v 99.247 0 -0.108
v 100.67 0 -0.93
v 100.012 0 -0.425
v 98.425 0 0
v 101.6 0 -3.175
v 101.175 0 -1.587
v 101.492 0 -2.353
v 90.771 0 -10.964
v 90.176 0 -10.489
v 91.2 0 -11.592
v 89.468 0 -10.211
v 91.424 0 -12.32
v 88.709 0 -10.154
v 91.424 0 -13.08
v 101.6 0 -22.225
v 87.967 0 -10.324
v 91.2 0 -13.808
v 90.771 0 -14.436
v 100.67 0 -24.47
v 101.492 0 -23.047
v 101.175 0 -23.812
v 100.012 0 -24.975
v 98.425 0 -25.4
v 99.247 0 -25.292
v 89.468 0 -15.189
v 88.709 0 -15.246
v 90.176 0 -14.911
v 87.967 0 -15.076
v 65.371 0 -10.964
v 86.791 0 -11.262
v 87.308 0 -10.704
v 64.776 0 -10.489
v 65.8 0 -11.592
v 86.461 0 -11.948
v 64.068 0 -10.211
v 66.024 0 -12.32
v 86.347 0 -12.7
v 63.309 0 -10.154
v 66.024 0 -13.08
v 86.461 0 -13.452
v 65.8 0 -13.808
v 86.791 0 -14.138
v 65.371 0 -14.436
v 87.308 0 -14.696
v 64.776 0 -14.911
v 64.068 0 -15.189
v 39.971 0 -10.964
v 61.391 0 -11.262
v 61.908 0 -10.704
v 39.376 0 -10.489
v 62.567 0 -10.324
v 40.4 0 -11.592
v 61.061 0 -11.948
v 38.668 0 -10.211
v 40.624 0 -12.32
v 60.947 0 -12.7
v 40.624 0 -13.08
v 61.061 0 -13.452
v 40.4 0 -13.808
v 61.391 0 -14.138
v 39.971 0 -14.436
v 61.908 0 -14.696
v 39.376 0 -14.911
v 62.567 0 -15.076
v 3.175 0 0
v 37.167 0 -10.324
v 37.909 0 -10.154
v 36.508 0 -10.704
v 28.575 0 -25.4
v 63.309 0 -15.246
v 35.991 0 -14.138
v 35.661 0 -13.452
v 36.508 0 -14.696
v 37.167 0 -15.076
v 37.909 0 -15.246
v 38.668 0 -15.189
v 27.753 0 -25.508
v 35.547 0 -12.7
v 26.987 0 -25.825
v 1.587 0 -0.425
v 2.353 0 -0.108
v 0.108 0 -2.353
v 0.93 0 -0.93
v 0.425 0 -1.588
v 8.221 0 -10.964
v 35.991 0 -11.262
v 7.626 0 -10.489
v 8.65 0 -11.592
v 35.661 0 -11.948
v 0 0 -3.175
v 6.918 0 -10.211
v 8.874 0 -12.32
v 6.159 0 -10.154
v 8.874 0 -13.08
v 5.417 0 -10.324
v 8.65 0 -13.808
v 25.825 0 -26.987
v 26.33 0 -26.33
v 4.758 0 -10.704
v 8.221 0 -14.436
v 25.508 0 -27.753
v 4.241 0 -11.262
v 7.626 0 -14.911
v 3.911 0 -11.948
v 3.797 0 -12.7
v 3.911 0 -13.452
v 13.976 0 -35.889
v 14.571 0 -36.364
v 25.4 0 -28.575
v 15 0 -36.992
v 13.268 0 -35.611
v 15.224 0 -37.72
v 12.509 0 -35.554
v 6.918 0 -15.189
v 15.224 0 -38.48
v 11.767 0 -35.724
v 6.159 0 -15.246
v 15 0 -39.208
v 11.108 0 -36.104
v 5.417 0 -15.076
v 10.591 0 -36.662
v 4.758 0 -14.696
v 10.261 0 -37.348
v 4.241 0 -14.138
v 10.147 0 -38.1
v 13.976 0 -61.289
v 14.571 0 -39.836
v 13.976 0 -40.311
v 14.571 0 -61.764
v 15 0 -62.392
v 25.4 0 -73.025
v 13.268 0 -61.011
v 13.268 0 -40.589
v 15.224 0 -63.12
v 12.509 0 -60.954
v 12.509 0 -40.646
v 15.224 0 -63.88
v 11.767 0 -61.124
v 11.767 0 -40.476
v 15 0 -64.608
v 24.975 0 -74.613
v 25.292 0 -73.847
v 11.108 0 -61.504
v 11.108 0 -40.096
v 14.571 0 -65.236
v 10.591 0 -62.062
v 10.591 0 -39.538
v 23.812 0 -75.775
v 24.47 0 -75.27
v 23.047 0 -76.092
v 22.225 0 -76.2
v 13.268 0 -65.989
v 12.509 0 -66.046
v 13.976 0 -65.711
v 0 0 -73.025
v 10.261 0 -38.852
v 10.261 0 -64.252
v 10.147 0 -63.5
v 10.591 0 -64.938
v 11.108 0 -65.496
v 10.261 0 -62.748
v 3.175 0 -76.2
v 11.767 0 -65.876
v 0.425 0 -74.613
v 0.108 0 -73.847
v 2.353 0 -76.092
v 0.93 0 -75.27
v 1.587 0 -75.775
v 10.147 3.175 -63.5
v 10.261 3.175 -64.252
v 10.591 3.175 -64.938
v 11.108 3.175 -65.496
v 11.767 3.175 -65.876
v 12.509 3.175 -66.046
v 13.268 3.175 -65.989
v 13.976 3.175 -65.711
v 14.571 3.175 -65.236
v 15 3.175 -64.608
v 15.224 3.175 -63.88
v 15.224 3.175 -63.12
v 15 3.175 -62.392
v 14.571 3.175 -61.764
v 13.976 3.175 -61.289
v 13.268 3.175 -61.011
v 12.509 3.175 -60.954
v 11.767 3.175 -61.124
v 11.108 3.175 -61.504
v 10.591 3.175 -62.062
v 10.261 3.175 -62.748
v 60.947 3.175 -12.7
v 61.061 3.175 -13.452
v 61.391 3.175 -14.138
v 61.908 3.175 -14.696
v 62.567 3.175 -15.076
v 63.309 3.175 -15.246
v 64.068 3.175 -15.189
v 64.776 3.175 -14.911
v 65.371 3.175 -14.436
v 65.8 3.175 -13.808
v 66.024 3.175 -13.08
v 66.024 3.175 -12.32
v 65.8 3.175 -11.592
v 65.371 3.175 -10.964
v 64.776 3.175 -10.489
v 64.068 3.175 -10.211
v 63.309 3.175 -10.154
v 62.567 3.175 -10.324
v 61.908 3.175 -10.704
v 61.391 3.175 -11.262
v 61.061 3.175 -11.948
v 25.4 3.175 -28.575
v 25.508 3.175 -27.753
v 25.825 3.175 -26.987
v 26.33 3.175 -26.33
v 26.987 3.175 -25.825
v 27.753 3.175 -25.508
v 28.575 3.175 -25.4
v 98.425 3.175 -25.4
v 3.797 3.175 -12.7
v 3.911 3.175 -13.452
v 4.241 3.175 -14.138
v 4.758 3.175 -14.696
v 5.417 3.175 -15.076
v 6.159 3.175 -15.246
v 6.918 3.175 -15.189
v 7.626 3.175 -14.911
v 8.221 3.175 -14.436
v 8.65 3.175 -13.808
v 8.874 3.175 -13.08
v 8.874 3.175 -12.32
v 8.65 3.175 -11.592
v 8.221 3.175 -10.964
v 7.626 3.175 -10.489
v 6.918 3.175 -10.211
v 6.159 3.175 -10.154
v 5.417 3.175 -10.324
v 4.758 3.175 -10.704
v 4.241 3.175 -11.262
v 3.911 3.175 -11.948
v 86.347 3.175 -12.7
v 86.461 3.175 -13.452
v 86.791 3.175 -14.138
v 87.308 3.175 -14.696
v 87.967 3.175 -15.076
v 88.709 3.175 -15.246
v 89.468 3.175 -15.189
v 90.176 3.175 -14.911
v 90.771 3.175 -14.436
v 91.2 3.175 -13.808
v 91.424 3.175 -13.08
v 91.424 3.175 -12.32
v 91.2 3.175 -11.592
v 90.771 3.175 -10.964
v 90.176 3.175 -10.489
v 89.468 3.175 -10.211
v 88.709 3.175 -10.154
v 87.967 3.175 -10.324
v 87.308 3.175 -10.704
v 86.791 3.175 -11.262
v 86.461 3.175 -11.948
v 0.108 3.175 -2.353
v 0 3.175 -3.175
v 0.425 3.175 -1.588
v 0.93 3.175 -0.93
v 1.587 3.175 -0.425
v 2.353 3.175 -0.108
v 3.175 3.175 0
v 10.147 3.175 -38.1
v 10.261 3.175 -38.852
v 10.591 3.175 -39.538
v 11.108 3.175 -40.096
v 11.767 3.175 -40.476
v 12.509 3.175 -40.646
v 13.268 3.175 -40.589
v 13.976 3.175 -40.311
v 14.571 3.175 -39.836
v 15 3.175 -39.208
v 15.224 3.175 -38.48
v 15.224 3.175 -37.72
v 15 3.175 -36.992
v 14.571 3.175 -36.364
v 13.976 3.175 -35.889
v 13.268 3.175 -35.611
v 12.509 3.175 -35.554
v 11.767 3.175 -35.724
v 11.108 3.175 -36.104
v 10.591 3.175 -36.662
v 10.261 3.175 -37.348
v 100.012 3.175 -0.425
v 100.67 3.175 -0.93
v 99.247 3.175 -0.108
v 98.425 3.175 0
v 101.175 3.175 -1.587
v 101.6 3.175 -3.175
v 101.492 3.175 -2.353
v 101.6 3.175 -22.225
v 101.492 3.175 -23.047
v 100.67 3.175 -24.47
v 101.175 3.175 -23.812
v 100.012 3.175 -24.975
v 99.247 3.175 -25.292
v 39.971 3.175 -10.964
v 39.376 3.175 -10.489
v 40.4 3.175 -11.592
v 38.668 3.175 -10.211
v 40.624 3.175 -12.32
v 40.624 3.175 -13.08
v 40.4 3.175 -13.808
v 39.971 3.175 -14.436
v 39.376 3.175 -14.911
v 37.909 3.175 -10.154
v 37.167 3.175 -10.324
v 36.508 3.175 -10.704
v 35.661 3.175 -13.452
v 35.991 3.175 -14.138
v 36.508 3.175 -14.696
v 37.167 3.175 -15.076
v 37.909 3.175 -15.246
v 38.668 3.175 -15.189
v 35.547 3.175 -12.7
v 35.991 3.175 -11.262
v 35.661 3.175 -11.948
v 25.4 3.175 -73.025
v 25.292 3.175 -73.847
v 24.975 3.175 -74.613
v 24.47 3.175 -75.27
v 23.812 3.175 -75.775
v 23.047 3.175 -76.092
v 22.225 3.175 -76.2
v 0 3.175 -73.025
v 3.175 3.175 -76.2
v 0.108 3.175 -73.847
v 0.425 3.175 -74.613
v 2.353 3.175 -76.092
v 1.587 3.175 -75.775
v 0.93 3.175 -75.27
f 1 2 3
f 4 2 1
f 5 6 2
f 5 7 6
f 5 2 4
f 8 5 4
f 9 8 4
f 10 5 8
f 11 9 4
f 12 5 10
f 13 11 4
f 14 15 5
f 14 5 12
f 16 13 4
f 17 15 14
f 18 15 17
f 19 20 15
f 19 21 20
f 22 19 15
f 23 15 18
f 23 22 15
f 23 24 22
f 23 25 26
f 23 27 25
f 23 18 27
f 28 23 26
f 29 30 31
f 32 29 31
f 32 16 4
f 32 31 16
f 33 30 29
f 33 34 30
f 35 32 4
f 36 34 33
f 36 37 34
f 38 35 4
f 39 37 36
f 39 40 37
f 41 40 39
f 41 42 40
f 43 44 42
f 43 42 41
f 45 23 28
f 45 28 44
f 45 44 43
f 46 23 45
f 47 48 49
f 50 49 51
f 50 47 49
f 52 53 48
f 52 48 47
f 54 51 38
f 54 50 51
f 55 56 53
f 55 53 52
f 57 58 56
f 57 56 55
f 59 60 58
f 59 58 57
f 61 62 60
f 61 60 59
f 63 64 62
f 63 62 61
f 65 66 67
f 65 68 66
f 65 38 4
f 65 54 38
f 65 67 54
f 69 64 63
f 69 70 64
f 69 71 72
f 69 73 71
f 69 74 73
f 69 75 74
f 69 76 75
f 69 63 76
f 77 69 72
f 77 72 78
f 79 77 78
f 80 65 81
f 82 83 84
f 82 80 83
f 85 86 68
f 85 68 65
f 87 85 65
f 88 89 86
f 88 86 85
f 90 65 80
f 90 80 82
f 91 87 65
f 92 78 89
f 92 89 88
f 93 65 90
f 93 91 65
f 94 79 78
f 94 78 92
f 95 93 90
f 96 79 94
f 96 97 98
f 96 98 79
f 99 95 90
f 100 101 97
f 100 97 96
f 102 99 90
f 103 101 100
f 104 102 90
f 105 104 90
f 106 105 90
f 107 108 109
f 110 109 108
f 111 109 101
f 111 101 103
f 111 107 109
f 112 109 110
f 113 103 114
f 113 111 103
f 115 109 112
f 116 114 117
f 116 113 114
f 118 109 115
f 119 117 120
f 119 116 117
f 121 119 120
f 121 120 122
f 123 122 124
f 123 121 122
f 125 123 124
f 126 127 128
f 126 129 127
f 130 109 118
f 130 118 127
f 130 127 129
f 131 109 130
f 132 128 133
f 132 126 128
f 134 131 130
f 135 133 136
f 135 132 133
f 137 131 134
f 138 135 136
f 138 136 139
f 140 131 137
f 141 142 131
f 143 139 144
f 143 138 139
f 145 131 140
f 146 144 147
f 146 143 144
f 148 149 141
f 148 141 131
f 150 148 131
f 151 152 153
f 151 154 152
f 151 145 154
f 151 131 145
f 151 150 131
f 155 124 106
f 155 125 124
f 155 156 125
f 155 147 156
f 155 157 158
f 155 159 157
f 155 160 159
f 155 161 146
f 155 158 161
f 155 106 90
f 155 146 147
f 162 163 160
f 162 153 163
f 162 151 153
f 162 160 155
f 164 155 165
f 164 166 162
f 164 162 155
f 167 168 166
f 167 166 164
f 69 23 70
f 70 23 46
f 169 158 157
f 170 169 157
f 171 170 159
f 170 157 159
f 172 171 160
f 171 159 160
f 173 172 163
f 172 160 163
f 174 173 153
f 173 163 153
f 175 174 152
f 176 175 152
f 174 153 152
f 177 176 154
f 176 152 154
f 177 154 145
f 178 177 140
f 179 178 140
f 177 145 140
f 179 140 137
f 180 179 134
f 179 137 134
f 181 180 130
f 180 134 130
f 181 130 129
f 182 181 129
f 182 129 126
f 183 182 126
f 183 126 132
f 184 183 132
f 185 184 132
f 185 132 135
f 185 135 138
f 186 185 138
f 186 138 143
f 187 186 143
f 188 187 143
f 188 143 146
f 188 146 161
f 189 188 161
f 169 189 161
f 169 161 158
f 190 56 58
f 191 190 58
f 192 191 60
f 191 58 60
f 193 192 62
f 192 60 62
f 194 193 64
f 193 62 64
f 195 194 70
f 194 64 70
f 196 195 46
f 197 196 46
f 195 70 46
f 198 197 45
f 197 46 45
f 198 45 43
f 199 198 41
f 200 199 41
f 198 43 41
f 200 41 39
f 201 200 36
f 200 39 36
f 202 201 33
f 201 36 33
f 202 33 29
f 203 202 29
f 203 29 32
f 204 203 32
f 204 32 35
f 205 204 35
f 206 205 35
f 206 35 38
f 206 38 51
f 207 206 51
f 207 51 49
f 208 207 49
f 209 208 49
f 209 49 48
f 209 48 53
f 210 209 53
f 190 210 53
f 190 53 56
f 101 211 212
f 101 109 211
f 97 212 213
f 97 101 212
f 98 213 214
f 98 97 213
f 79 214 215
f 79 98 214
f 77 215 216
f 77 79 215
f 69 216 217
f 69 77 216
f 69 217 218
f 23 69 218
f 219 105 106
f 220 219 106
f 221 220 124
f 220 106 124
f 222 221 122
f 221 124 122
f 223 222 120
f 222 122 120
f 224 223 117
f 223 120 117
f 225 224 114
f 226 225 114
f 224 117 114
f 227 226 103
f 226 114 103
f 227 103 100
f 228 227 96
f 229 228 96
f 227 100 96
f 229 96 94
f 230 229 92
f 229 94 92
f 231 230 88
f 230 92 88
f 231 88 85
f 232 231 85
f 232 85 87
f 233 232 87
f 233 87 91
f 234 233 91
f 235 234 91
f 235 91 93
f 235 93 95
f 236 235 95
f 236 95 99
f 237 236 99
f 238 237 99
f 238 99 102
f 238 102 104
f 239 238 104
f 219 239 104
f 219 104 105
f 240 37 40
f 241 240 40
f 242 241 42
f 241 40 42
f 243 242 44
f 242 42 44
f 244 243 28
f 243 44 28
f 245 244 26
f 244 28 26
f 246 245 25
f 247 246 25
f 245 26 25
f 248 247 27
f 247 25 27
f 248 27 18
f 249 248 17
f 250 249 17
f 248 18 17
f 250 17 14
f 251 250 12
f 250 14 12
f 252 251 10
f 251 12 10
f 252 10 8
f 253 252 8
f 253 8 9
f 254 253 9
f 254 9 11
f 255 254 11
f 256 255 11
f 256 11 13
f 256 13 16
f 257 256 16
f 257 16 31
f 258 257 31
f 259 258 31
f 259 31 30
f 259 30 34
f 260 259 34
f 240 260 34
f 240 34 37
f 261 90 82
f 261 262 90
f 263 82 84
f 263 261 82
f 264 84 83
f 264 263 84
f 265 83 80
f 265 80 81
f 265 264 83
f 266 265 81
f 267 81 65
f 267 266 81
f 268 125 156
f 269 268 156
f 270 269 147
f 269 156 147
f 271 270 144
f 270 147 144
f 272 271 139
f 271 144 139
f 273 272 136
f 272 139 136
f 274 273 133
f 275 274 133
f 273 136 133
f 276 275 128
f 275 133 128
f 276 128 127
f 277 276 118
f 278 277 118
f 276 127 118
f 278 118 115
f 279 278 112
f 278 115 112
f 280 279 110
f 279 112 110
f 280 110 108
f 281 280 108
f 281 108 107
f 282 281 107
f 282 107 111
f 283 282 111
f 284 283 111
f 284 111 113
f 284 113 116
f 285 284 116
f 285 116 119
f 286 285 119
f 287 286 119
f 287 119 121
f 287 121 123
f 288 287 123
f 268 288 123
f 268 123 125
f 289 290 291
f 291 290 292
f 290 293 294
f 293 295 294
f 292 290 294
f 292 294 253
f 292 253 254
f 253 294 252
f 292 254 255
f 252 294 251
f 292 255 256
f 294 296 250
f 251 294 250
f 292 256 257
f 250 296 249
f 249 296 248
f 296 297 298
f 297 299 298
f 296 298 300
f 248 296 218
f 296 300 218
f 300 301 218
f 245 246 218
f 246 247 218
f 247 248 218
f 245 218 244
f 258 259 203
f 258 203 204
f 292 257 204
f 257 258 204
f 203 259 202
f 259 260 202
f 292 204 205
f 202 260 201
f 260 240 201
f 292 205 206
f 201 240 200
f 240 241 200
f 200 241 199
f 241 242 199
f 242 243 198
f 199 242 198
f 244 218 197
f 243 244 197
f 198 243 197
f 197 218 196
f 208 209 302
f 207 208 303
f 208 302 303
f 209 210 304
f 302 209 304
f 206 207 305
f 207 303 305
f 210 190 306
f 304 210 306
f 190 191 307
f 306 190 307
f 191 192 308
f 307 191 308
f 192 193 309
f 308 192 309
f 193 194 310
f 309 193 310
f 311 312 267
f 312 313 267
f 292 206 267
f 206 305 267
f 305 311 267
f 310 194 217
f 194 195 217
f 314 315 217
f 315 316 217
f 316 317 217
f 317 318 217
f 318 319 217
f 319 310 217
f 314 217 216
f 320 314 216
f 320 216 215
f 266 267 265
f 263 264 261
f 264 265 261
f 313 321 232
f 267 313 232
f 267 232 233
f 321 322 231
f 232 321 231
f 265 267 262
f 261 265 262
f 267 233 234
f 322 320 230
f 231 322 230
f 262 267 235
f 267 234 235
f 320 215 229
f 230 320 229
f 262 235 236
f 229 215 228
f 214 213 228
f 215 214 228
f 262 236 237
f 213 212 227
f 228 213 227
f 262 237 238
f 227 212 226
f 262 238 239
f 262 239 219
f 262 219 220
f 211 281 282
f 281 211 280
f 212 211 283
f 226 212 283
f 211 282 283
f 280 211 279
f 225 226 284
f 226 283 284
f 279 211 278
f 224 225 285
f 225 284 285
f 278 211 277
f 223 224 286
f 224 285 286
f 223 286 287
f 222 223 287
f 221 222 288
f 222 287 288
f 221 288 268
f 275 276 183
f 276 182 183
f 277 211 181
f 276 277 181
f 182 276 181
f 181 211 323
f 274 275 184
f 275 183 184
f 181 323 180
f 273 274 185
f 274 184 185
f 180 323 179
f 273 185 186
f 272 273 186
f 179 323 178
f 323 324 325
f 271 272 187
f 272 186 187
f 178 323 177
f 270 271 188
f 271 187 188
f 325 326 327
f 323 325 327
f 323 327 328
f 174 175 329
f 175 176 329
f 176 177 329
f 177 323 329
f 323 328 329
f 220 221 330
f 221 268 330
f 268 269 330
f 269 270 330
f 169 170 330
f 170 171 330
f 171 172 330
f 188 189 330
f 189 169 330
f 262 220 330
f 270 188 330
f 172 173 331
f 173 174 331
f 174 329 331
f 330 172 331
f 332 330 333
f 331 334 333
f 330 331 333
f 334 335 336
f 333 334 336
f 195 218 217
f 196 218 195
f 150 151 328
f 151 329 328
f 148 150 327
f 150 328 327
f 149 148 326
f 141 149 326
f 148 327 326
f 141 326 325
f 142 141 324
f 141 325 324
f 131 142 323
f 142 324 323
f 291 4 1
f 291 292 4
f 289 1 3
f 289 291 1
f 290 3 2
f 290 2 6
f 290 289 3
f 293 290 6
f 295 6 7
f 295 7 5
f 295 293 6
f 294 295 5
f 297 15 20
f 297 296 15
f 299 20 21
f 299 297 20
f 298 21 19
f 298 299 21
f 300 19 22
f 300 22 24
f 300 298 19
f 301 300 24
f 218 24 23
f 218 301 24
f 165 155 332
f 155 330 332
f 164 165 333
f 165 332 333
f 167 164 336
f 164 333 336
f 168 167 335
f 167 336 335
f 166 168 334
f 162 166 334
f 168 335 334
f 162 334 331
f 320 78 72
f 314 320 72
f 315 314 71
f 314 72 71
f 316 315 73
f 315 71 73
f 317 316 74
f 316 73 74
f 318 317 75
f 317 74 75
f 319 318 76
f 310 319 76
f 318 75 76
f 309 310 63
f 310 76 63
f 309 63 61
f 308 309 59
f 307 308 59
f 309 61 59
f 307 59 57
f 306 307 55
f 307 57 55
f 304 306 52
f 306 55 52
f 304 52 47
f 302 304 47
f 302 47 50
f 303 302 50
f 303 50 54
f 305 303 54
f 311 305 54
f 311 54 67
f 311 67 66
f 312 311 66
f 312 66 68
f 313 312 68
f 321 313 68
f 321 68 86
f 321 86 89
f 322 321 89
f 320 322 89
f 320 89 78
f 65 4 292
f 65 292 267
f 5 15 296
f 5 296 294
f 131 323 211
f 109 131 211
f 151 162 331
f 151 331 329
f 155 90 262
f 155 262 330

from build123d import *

# Parameters (mm, degrees)
BOSS_EXTRUDE1_DEPTH    = 3.175
F_10_CLEARANCE_HOLE1_D = 5.1054
F_10_CLEARANCE_HOLE4_D = 5.1054
CUT_EXTRUDE1_DEPTH     = 128.039681301
FILLET1_R              = 3.175


with BuildPart() as part:
    # Sketch1 → Boss-Extrude1 (new body)
    with BuildSketch(Plane(origin=(0, 0, 0), x_dir=(1, 0, 0), z_dir=(0, 1, 0))):
        Polygon((0, 0), (0, 76.2), (25.4, 76.2), (101.6, 25.4), (101.6, 0), align=None)
    extrude(amount=BOSS_EXTRUDE1_DEPTH)

    # #10 Clearance Hole1 (through all)
    with Locations(Plane(origin=(0, 3.175, 0), x_dir=(1, 0, 0), z_dir=(0, 1, 0))):
        with Locations((88.9, 12.7), (12.7, 63.5), (12.7, 38.1), (38.1, 12.7), (63.5, 12.7)):
            Hole(F_10_CLEARANCE_HOLE1_D / 2)

    # #10 Clearance Hole4 (through all)
    with Locations(Plane(origin=(0, 3.175, 0), x_dir=(1, 0, 0), z_dir=(0, 1, 0))):
        with Locations((6.35, 12.7)):
            Hole(F_10_CLEARANCE_HOLE4_D / 2)

    # Sketch6 → Cut-Extrude1 (cut, through all)
    with BuildSketch(Plane(origin=(0, 3.175, 0), x_dir=(1, 0, 0), z_dir=(0, 1, 0))):
        Polygon((25.4, 76.2), (25.4, 25.4), (101.6, 25.4), align=None)
    extrude(amount=-CUT_EXTRUDE1_DEPTH, mode=Mode.SUBTRACT)

    # Fillet1
    fillet1_edges = [part.edges().sort_by_distance(p)[0] for p in [
        (25.4, 1.5875, -25.4),
        (0, 1.5875, 0),
        (0, 1.5875, -76.2),
        (25.4, 1.5875, -76.2),
        (101.6, 1.5875, -25.4),
        (101.6, 1.5875, 0),
    ]]
    fillet(fillet1_edges, radius=FILLET1_R)


solid = part.part
